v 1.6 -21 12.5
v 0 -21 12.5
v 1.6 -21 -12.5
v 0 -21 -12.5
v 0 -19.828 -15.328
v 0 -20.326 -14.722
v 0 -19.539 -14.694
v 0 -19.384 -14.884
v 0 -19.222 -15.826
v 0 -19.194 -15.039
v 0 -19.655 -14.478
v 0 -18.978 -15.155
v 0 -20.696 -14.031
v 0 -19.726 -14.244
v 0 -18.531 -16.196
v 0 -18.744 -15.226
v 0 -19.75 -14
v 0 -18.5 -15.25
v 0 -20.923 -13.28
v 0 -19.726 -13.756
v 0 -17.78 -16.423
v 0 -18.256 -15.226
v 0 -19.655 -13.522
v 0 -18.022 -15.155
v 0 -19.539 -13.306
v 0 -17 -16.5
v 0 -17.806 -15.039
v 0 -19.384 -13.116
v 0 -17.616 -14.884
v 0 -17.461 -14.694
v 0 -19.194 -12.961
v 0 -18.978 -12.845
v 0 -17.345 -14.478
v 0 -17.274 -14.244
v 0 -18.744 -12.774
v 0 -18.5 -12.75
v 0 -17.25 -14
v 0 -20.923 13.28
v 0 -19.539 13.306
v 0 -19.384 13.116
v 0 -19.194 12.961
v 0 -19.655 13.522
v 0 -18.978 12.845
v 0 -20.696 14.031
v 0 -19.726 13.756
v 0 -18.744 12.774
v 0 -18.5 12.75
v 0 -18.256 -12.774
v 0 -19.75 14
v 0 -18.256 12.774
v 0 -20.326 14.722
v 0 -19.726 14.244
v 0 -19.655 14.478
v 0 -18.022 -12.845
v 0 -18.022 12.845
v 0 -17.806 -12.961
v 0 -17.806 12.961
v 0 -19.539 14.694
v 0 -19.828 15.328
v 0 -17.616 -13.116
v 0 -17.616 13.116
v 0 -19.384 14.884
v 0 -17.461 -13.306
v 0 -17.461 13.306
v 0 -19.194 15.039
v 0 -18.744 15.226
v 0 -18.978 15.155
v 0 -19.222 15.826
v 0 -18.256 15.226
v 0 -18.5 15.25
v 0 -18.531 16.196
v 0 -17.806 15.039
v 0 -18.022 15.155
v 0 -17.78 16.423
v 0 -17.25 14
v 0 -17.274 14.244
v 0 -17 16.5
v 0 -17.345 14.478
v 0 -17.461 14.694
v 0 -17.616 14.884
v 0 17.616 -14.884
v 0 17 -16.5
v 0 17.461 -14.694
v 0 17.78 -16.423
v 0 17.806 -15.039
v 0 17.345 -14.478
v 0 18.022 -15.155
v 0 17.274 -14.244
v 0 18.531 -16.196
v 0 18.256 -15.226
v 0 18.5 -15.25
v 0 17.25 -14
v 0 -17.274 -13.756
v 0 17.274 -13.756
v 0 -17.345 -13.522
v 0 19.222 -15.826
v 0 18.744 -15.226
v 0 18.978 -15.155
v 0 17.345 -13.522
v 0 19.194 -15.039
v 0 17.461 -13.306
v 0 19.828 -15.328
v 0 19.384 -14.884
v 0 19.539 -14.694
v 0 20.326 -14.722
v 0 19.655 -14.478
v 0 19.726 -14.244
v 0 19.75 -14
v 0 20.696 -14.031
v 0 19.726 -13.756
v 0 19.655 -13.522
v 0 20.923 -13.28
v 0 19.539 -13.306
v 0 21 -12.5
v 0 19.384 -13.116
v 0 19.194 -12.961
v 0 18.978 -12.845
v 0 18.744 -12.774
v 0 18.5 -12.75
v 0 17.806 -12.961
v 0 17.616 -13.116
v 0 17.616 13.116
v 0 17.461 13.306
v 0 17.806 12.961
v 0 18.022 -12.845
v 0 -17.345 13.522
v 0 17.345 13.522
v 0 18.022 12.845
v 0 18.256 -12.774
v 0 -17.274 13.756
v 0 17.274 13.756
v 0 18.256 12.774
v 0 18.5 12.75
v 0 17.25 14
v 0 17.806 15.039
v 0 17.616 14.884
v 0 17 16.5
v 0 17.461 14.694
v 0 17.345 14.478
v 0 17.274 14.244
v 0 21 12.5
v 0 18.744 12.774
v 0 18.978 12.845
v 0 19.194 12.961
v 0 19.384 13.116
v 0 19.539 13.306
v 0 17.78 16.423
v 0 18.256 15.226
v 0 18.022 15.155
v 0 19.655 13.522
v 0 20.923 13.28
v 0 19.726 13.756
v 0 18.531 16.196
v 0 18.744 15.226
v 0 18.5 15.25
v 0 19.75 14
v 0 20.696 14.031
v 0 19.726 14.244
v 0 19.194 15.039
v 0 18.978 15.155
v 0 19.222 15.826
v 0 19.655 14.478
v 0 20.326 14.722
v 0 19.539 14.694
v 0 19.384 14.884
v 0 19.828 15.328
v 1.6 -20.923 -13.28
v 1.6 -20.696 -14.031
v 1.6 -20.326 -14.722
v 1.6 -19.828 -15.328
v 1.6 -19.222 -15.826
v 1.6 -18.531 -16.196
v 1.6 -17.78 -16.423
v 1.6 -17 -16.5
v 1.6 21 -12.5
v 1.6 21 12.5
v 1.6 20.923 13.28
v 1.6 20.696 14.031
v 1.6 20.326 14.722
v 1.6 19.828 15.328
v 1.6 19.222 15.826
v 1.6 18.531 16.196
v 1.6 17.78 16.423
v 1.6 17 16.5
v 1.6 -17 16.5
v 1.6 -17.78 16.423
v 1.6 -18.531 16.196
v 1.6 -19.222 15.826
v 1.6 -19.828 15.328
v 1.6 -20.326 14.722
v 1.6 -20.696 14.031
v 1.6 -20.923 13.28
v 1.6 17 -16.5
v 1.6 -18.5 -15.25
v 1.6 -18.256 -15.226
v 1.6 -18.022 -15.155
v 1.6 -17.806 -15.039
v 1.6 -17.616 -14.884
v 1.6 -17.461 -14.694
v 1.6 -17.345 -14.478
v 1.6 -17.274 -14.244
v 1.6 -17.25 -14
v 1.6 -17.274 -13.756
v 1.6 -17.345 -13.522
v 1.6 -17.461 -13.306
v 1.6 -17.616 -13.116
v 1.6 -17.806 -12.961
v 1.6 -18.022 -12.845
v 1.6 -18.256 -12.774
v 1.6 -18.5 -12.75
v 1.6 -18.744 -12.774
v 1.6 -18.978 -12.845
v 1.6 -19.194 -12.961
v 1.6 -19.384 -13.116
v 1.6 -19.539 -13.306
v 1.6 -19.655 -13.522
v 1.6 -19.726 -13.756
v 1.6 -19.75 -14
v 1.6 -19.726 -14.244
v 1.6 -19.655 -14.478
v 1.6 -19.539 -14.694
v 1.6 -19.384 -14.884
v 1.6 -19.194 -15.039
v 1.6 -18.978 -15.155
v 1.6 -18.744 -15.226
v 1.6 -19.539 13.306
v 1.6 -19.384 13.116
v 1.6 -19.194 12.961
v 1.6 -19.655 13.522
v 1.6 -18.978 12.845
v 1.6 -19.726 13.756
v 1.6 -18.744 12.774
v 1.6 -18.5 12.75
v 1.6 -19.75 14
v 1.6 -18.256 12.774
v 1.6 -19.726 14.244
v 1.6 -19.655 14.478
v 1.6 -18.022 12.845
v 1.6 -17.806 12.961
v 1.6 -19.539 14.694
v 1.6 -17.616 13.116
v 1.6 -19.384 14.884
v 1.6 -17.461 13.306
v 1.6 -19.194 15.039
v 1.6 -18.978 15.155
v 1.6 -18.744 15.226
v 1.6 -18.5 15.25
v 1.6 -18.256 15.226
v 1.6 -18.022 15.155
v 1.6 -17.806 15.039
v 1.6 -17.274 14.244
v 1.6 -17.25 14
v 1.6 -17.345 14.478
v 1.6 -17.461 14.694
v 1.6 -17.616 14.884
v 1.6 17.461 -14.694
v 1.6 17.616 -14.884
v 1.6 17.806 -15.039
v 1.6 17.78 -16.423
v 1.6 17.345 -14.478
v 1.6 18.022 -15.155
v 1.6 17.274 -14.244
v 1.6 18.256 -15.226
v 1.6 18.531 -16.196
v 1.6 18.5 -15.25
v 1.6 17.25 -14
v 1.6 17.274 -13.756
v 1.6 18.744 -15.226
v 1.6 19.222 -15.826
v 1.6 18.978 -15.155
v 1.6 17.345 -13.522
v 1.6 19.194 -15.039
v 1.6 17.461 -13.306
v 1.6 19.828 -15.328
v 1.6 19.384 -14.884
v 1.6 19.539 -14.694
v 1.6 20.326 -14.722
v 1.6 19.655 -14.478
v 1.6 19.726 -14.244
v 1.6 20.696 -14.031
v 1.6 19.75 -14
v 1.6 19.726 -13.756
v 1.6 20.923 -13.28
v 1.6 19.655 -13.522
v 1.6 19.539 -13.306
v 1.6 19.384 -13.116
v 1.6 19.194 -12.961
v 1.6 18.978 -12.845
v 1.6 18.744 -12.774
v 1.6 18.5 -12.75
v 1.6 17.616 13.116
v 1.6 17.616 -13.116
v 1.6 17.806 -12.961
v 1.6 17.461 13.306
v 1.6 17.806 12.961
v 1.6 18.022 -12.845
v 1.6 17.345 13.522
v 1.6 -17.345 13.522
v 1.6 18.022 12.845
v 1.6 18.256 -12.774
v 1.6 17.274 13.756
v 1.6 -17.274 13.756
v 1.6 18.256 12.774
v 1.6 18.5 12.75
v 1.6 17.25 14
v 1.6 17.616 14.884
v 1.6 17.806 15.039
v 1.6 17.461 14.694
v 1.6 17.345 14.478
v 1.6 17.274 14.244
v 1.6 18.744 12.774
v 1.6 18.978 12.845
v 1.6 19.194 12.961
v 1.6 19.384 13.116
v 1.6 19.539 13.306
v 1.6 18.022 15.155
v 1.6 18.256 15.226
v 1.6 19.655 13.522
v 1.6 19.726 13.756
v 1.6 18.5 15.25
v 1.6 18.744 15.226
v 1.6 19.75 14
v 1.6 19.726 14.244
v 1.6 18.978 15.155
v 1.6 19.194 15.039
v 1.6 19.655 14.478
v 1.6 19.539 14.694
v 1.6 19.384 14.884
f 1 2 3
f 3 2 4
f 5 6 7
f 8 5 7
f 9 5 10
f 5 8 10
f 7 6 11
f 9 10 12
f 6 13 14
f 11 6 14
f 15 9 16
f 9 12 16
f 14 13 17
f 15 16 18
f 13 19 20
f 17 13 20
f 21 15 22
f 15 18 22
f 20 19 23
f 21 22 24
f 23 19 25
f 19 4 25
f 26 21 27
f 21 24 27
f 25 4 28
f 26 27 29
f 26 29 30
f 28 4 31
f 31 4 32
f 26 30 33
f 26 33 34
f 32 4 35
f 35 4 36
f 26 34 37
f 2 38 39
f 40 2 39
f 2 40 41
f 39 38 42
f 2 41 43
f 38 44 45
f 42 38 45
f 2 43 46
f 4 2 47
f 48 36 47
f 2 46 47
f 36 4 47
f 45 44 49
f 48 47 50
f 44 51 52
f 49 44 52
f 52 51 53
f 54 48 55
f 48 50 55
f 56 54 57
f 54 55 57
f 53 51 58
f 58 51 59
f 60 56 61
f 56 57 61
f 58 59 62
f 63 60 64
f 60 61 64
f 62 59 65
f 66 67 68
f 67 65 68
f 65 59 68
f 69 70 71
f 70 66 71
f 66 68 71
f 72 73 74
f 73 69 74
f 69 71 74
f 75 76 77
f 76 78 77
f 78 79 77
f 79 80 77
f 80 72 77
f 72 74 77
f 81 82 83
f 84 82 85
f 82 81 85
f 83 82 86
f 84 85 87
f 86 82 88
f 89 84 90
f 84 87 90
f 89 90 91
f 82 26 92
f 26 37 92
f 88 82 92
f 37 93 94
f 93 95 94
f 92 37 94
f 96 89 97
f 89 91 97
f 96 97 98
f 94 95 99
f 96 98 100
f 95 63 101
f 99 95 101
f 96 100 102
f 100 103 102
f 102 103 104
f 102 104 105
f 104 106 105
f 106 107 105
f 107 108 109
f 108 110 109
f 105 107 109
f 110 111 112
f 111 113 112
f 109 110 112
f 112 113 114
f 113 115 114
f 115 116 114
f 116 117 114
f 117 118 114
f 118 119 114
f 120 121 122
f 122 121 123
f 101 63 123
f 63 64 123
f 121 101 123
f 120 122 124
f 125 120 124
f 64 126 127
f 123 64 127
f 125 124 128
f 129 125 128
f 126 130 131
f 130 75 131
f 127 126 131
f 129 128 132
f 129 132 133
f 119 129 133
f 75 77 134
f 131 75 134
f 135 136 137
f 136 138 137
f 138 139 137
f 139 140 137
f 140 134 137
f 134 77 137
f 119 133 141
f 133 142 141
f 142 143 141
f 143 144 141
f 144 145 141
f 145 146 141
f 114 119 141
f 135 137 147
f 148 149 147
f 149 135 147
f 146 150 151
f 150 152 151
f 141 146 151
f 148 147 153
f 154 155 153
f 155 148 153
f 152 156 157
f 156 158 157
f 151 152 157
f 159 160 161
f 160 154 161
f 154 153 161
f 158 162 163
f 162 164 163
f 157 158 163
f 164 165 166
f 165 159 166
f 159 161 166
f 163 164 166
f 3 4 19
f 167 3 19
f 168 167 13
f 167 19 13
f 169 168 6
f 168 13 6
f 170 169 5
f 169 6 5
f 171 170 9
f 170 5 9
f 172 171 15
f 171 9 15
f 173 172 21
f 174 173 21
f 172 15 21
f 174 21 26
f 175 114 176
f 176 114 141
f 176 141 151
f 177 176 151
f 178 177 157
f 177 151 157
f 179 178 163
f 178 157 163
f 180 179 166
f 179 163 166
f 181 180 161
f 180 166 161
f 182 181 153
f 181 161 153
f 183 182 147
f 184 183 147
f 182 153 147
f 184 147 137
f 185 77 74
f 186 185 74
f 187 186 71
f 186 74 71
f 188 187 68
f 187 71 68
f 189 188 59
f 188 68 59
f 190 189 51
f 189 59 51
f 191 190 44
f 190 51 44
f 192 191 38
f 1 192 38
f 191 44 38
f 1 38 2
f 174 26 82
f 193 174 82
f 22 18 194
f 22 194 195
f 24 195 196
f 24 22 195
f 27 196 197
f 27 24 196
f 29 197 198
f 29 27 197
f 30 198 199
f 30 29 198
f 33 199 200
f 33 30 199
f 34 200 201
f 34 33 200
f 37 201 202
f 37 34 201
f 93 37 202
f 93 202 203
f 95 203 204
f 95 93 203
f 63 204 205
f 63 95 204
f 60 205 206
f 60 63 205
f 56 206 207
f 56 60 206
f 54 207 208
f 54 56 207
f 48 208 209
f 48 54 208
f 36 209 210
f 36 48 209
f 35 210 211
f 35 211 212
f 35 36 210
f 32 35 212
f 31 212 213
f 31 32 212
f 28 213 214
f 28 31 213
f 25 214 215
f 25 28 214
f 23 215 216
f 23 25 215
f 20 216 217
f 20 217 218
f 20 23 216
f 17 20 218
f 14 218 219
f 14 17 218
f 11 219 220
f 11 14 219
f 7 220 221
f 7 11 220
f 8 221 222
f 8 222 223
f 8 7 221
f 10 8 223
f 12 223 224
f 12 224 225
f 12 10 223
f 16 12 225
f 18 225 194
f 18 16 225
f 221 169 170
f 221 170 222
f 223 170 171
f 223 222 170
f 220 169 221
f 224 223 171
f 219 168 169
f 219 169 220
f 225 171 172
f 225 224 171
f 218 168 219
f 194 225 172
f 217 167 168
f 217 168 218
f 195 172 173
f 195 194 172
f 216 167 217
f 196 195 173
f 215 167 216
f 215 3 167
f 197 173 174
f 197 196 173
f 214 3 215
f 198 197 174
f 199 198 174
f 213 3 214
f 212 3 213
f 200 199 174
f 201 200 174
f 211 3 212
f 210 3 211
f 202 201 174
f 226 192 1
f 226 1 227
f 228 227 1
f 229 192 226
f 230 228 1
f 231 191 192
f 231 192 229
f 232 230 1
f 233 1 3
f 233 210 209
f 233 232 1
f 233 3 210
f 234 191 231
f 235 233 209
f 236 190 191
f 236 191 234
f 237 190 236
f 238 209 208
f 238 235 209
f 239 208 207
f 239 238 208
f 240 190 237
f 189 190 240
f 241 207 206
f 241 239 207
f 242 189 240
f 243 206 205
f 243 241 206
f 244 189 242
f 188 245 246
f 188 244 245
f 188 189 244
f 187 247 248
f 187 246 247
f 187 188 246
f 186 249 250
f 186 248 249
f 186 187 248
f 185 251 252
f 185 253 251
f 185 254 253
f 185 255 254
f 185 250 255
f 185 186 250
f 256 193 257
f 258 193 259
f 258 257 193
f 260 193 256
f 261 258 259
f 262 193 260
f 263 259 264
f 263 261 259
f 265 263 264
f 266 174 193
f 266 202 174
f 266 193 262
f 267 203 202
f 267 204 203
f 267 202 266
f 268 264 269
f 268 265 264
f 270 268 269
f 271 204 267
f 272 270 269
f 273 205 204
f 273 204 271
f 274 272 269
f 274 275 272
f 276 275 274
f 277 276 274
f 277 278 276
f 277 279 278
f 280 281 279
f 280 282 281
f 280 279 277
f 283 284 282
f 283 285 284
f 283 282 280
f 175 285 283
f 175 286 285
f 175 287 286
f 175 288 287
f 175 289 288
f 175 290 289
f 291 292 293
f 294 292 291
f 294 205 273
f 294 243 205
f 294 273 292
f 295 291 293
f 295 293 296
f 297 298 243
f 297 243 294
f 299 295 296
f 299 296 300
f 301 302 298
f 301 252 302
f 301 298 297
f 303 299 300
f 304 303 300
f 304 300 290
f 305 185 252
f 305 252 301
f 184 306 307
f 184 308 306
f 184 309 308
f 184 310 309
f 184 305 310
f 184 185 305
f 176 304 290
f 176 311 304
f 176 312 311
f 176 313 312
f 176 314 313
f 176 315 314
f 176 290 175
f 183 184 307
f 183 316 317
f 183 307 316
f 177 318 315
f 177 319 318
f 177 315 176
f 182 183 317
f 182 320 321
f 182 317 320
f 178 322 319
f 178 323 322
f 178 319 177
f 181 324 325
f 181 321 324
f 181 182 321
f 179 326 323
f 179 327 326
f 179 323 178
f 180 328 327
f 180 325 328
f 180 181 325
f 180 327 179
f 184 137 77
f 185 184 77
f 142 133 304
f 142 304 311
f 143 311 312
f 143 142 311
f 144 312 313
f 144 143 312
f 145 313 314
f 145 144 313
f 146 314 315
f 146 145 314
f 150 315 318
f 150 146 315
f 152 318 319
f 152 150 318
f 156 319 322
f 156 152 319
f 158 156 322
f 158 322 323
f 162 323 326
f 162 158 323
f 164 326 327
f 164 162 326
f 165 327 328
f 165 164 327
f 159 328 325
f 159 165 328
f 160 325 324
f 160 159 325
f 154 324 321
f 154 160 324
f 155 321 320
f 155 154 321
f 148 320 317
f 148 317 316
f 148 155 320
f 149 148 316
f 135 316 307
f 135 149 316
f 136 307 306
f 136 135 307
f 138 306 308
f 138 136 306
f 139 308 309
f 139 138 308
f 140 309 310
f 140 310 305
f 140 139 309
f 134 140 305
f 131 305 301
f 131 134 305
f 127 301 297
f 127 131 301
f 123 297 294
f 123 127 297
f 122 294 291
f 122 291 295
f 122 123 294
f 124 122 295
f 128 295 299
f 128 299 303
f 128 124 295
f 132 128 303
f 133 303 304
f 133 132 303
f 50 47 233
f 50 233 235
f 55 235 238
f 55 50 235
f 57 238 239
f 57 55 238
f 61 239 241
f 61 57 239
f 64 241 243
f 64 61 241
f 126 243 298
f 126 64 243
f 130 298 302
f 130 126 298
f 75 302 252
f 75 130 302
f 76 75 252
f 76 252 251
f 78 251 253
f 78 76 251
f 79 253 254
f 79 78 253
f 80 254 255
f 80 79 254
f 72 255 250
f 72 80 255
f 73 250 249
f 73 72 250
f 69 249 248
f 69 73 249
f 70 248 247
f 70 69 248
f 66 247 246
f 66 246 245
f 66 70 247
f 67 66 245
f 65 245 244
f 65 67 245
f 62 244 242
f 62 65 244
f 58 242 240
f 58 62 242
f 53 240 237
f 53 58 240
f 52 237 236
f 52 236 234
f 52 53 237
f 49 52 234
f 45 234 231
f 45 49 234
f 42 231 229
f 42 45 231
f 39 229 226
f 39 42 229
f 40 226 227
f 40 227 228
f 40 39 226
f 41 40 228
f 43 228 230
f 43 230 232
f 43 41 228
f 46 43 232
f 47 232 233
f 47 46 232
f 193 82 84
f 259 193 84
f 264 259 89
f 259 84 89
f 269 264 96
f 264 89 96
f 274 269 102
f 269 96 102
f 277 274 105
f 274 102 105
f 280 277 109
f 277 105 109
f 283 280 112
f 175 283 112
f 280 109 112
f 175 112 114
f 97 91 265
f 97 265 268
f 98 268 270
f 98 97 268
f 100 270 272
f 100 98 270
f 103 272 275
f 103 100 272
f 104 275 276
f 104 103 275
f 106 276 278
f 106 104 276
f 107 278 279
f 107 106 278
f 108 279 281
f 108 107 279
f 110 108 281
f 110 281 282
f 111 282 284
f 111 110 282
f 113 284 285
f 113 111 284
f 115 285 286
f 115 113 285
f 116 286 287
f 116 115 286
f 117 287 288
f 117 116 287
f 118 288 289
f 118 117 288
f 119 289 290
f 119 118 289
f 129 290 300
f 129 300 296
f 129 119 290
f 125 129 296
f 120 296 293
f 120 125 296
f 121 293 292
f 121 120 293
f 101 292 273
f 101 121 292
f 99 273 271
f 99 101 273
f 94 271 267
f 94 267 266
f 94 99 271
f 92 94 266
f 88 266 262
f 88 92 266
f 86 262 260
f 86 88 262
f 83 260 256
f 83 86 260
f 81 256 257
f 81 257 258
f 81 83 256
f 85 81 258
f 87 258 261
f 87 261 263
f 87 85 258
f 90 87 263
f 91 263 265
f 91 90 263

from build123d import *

# Parameters (mm, degrees)
SKETCH2_R           = 1.25
BOSS_EXTRUDE1_DEPTH = 1.6


with BuildPart() as part:
    # Sketch2 → Boss-Extrude1 (new body)
    with BuildSketch(Plane.YZ):
        with BuildLine():
            Line((-17, -16.5), (17, -16.5))
            ThreePointArc((17, -16.5), (19.828427125, -15.328427125), (21, -12.5))
            Line((21, -12.5), (21, 12.5))
            ThreePointArc((21, 12.5), (19.828427125, 15.328427125), (17, 16.5))
            Line((17, 16.5), (-17, 16.5))
            ThreePointArc((-17, 16.5), (-19.828427125, 15.328427125), (-21, 12.5))
            Line((-21, 12.5), (-21, -12.5))
            ThreePointArc((-21, -12.5), (-19.828427125, -15.328427125), (-17, -16.5))
        make_face()
        with Locations(Location((-18.5, 14, 0), (0, 0, 270))):
            Circle(SKETCH2_R, mode=Mode.SUBTRACT)
        with Locations(Location((-18.5, -14, 0), (0, 0, 270))):
            Circle(SKETCH2_R, mode=Mode.SUBTRACT)
        with Locations(Location((18.5, 14, 0), (0, 0, 270))):
            Circle(SKETCH2_R, mode=Mode.SUBTRACT)
        with Locations(Location((18.5, -14, 0), (0, 0, 270))):
            Circle(SKETCH2_R, mode=Mode.SUBTRACT)
    extrude(amount=BOSS_EXTRUDE1_DEPTH)


solid = part.part
